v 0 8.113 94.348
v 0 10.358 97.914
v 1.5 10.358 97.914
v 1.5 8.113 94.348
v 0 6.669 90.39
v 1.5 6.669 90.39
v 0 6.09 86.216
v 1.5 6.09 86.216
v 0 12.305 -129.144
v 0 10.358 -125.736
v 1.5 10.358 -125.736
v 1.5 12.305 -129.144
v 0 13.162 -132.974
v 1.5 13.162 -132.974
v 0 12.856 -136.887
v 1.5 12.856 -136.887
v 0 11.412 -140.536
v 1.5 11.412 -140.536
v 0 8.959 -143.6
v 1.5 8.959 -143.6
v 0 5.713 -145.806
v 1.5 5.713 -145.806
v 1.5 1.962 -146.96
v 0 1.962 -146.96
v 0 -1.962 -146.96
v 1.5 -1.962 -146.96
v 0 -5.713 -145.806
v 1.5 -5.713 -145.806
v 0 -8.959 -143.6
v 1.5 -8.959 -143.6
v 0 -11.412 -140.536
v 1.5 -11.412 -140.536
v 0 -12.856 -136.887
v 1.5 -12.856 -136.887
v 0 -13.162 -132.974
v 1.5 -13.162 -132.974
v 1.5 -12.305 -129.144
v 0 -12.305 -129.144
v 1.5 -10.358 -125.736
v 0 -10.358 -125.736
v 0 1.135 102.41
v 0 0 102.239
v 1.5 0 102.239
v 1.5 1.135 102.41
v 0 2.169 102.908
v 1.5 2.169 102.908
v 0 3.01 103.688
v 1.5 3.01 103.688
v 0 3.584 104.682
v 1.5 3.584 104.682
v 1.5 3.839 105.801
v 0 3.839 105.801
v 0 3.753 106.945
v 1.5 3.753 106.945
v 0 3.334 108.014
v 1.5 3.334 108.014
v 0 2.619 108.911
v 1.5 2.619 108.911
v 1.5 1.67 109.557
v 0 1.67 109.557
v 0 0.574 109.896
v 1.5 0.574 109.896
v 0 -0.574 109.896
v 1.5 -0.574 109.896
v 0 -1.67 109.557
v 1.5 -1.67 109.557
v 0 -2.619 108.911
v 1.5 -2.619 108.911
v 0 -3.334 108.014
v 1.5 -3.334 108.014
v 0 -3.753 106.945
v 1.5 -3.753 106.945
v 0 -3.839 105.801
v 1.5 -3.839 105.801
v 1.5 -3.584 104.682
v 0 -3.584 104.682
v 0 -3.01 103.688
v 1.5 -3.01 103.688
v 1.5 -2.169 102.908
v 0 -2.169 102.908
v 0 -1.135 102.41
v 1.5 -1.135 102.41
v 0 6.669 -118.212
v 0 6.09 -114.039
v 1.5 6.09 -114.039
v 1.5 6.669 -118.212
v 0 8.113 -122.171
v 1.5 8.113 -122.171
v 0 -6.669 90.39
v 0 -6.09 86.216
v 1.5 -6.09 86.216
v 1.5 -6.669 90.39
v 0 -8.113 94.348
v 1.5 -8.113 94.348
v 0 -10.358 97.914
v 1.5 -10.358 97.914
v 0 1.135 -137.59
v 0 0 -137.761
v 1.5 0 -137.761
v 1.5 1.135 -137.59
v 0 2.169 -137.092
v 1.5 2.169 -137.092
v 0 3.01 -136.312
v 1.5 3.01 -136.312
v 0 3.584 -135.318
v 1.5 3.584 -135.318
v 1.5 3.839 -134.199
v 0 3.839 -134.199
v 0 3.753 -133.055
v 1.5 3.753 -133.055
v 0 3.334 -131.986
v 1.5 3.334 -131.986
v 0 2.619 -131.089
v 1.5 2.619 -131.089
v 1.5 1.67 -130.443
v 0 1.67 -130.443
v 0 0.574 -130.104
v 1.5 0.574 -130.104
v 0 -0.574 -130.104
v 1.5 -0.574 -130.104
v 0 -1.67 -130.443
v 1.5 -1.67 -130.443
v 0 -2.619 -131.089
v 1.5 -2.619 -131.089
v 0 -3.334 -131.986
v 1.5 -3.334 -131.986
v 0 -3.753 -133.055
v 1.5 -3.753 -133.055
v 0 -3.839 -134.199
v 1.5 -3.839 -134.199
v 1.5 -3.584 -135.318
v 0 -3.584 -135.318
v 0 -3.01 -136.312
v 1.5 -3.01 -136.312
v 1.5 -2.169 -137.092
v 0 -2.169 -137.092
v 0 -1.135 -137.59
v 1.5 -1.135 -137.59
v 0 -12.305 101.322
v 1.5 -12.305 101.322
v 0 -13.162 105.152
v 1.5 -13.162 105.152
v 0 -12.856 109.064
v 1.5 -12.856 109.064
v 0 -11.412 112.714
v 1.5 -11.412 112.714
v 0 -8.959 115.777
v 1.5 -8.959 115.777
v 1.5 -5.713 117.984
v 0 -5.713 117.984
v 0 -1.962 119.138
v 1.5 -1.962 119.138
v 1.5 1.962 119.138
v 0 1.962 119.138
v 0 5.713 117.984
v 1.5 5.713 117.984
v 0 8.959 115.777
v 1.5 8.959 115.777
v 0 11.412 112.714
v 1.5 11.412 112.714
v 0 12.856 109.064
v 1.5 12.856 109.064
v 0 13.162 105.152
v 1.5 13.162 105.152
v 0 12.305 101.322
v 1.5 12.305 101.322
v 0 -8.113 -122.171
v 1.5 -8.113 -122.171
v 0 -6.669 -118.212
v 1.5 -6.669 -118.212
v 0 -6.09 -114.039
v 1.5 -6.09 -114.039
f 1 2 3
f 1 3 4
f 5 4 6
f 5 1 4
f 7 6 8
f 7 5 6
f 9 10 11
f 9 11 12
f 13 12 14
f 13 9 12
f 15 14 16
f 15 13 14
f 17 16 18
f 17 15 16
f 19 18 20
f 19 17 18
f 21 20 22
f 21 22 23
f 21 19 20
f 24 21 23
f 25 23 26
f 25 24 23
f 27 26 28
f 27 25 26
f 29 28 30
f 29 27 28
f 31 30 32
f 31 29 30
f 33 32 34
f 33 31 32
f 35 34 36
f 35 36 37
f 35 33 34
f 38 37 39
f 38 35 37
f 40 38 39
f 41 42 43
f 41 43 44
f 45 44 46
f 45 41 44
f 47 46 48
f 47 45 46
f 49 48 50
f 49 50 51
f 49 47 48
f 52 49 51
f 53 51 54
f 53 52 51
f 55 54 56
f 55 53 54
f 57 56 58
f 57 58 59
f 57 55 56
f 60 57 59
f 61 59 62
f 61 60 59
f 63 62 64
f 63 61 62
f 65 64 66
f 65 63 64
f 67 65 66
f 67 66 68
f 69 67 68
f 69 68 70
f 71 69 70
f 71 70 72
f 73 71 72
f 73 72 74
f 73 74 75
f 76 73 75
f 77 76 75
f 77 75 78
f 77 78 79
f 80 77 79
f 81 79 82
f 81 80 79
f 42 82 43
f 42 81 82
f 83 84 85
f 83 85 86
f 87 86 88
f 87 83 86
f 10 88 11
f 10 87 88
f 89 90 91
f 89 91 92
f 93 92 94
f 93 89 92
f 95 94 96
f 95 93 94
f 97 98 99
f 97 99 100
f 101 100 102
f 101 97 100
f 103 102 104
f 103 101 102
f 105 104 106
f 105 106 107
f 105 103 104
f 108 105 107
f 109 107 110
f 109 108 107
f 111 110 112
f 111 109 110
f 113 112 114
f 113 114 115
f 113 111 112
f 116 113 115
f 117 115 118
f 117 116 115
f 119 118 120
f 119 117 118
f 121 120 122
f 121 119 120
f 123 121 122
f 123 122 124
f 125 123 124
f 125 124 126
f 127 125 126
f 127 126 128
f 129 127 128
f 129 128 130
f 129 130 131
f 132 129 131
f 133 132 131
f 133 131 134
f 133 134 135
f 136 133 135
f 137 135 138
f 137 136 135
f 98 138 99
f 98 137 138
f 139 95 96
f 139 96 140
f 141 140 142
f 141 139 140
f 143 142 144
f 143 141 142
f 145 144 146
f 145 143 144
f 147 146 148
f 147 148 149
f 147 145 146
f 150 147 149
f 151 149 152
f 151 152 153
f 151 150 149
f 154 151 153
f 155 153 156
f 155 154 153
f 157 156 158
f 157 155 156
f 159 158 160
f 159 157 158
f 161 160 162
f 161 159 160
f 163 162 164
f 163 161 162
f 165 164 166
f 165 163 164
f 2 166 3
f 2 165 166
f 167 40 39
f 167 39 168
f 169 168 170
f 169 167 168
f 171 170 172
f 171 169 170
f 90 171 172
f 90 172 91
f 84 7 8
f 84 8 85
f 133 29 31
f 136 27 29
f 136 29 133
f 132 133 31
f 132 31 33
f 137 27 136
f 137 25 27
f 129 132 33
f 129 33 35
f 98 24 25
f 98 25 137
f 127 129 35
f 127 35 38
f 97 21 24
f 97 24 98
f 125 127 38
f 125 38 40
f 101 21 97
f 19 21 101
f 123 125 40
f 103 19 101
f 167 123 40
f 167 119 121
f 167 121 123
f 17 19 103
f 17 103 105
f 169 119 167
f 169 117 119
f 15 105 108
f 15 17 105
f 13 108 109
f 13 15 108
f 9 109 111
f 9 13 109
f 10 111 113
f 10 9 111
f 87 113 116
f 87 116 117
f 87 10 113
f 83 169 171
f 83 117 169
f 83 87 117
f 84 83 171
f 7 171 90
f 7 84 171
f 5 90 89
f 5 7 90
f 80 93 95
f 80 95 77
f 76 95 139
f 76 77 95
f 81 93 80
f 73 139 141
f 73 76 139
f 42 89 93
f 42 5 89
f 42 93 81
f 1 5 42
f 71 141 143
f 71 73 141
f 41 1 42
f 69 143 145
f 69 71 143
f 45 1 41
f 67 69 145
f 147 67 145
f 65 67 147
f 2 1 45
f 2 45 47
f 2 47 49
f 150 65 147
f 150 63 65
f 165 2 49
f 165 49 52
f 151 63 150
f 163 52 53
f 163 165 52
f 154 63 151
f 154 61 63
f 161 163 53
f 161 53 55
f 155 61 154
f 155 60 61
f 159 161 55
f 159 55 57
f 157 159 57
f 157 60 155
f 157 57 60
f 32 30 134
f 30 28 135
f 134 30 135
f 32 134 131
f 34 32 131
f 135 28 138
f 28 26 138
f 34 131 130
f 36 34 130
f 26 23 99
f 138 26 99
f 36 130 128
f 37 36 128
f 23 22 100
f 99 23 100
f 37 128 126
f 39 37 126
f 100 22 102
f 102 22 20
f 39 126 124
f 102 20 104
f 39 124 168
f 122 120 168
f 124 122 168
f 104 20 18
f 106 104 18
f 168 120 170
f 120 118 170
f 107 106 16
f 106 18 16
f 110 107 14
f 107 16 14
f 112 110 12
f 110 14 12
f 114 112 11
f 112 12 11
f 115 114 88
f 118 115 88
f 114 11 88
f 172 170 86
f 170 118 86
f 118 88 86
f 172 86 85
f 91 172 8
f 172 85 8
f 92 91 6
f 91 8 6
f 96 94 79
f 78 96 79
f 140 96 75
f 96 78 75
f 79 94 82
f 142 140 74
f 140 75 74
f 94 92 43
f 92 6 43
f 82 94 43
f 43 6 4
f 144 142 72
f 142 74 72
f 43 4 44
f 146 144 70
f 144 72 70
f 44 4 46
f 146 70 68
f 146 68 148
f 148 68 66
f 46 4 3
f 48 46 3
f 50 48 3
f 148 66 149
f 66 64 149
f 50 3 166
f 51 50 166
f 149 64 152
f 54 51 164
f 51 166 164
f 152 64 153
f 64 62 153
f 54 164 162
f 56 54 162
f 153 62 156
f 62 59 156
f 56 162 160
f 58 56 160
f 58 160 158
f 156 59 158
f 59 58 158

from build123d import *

# Parameters (mm, degrees)
SKETCH_2_R      = 3.85
EXTRUDE_1_DEPTH = 1.5


with BuildPart() as part:
    # 草圖2 → 填料-伸長1 (new body)
    with BuildSketch(Plane(origin=(0, 0, 0), x_dir=(0, 0, -1), z_dir=(1, 0, 0))):
        with BuildLine():
            Line((-86.216124971, 6.090280685), (114.038610046, 6.090280685))
            ThreePointArc((114.038610046, 6.090280685), (120.229892502, 7.285685691), (125.736176674, 10.35843791))
            ThreePointArc((125.736176674, 10.35843791), (147.107034966, 0), (125.736176674, -10.35843791))
            ThreePointArc((125.736176674, -10.35843791), (120.229892502, -7.285685691), (114.038610046, -6.090280685))
            Line((114.038610046, -6.090280685), (-86.216124971, -6.090280685))
            ThreePointArc((-86.216124971, -6.090280685), (-92.407407427, -7.285685691), (-97.913691598, -10.35843791))
            ThreePointArc((-97.913691598, -10.35843791), (-119.284549891, 0), (-97.913691598, 10.35843791))
            ThreePointArc((-97.913691598, 10.35843791), (-92.407407427, 7.285685691), (-86.216124971, 6.090280685))
        make_face()
        with Locations((133.911242538, 0)):
            Circle(SKETCH_2_R, mode=Mode.SUBTRACT)
        with Locations((-106.088757462, 0)):
            Circle(SKETCH_2_R, mode=Mode.SUBTRACT)
    extrude(amount=EXTRUDE_1_DEPTH)


solid = part.part
